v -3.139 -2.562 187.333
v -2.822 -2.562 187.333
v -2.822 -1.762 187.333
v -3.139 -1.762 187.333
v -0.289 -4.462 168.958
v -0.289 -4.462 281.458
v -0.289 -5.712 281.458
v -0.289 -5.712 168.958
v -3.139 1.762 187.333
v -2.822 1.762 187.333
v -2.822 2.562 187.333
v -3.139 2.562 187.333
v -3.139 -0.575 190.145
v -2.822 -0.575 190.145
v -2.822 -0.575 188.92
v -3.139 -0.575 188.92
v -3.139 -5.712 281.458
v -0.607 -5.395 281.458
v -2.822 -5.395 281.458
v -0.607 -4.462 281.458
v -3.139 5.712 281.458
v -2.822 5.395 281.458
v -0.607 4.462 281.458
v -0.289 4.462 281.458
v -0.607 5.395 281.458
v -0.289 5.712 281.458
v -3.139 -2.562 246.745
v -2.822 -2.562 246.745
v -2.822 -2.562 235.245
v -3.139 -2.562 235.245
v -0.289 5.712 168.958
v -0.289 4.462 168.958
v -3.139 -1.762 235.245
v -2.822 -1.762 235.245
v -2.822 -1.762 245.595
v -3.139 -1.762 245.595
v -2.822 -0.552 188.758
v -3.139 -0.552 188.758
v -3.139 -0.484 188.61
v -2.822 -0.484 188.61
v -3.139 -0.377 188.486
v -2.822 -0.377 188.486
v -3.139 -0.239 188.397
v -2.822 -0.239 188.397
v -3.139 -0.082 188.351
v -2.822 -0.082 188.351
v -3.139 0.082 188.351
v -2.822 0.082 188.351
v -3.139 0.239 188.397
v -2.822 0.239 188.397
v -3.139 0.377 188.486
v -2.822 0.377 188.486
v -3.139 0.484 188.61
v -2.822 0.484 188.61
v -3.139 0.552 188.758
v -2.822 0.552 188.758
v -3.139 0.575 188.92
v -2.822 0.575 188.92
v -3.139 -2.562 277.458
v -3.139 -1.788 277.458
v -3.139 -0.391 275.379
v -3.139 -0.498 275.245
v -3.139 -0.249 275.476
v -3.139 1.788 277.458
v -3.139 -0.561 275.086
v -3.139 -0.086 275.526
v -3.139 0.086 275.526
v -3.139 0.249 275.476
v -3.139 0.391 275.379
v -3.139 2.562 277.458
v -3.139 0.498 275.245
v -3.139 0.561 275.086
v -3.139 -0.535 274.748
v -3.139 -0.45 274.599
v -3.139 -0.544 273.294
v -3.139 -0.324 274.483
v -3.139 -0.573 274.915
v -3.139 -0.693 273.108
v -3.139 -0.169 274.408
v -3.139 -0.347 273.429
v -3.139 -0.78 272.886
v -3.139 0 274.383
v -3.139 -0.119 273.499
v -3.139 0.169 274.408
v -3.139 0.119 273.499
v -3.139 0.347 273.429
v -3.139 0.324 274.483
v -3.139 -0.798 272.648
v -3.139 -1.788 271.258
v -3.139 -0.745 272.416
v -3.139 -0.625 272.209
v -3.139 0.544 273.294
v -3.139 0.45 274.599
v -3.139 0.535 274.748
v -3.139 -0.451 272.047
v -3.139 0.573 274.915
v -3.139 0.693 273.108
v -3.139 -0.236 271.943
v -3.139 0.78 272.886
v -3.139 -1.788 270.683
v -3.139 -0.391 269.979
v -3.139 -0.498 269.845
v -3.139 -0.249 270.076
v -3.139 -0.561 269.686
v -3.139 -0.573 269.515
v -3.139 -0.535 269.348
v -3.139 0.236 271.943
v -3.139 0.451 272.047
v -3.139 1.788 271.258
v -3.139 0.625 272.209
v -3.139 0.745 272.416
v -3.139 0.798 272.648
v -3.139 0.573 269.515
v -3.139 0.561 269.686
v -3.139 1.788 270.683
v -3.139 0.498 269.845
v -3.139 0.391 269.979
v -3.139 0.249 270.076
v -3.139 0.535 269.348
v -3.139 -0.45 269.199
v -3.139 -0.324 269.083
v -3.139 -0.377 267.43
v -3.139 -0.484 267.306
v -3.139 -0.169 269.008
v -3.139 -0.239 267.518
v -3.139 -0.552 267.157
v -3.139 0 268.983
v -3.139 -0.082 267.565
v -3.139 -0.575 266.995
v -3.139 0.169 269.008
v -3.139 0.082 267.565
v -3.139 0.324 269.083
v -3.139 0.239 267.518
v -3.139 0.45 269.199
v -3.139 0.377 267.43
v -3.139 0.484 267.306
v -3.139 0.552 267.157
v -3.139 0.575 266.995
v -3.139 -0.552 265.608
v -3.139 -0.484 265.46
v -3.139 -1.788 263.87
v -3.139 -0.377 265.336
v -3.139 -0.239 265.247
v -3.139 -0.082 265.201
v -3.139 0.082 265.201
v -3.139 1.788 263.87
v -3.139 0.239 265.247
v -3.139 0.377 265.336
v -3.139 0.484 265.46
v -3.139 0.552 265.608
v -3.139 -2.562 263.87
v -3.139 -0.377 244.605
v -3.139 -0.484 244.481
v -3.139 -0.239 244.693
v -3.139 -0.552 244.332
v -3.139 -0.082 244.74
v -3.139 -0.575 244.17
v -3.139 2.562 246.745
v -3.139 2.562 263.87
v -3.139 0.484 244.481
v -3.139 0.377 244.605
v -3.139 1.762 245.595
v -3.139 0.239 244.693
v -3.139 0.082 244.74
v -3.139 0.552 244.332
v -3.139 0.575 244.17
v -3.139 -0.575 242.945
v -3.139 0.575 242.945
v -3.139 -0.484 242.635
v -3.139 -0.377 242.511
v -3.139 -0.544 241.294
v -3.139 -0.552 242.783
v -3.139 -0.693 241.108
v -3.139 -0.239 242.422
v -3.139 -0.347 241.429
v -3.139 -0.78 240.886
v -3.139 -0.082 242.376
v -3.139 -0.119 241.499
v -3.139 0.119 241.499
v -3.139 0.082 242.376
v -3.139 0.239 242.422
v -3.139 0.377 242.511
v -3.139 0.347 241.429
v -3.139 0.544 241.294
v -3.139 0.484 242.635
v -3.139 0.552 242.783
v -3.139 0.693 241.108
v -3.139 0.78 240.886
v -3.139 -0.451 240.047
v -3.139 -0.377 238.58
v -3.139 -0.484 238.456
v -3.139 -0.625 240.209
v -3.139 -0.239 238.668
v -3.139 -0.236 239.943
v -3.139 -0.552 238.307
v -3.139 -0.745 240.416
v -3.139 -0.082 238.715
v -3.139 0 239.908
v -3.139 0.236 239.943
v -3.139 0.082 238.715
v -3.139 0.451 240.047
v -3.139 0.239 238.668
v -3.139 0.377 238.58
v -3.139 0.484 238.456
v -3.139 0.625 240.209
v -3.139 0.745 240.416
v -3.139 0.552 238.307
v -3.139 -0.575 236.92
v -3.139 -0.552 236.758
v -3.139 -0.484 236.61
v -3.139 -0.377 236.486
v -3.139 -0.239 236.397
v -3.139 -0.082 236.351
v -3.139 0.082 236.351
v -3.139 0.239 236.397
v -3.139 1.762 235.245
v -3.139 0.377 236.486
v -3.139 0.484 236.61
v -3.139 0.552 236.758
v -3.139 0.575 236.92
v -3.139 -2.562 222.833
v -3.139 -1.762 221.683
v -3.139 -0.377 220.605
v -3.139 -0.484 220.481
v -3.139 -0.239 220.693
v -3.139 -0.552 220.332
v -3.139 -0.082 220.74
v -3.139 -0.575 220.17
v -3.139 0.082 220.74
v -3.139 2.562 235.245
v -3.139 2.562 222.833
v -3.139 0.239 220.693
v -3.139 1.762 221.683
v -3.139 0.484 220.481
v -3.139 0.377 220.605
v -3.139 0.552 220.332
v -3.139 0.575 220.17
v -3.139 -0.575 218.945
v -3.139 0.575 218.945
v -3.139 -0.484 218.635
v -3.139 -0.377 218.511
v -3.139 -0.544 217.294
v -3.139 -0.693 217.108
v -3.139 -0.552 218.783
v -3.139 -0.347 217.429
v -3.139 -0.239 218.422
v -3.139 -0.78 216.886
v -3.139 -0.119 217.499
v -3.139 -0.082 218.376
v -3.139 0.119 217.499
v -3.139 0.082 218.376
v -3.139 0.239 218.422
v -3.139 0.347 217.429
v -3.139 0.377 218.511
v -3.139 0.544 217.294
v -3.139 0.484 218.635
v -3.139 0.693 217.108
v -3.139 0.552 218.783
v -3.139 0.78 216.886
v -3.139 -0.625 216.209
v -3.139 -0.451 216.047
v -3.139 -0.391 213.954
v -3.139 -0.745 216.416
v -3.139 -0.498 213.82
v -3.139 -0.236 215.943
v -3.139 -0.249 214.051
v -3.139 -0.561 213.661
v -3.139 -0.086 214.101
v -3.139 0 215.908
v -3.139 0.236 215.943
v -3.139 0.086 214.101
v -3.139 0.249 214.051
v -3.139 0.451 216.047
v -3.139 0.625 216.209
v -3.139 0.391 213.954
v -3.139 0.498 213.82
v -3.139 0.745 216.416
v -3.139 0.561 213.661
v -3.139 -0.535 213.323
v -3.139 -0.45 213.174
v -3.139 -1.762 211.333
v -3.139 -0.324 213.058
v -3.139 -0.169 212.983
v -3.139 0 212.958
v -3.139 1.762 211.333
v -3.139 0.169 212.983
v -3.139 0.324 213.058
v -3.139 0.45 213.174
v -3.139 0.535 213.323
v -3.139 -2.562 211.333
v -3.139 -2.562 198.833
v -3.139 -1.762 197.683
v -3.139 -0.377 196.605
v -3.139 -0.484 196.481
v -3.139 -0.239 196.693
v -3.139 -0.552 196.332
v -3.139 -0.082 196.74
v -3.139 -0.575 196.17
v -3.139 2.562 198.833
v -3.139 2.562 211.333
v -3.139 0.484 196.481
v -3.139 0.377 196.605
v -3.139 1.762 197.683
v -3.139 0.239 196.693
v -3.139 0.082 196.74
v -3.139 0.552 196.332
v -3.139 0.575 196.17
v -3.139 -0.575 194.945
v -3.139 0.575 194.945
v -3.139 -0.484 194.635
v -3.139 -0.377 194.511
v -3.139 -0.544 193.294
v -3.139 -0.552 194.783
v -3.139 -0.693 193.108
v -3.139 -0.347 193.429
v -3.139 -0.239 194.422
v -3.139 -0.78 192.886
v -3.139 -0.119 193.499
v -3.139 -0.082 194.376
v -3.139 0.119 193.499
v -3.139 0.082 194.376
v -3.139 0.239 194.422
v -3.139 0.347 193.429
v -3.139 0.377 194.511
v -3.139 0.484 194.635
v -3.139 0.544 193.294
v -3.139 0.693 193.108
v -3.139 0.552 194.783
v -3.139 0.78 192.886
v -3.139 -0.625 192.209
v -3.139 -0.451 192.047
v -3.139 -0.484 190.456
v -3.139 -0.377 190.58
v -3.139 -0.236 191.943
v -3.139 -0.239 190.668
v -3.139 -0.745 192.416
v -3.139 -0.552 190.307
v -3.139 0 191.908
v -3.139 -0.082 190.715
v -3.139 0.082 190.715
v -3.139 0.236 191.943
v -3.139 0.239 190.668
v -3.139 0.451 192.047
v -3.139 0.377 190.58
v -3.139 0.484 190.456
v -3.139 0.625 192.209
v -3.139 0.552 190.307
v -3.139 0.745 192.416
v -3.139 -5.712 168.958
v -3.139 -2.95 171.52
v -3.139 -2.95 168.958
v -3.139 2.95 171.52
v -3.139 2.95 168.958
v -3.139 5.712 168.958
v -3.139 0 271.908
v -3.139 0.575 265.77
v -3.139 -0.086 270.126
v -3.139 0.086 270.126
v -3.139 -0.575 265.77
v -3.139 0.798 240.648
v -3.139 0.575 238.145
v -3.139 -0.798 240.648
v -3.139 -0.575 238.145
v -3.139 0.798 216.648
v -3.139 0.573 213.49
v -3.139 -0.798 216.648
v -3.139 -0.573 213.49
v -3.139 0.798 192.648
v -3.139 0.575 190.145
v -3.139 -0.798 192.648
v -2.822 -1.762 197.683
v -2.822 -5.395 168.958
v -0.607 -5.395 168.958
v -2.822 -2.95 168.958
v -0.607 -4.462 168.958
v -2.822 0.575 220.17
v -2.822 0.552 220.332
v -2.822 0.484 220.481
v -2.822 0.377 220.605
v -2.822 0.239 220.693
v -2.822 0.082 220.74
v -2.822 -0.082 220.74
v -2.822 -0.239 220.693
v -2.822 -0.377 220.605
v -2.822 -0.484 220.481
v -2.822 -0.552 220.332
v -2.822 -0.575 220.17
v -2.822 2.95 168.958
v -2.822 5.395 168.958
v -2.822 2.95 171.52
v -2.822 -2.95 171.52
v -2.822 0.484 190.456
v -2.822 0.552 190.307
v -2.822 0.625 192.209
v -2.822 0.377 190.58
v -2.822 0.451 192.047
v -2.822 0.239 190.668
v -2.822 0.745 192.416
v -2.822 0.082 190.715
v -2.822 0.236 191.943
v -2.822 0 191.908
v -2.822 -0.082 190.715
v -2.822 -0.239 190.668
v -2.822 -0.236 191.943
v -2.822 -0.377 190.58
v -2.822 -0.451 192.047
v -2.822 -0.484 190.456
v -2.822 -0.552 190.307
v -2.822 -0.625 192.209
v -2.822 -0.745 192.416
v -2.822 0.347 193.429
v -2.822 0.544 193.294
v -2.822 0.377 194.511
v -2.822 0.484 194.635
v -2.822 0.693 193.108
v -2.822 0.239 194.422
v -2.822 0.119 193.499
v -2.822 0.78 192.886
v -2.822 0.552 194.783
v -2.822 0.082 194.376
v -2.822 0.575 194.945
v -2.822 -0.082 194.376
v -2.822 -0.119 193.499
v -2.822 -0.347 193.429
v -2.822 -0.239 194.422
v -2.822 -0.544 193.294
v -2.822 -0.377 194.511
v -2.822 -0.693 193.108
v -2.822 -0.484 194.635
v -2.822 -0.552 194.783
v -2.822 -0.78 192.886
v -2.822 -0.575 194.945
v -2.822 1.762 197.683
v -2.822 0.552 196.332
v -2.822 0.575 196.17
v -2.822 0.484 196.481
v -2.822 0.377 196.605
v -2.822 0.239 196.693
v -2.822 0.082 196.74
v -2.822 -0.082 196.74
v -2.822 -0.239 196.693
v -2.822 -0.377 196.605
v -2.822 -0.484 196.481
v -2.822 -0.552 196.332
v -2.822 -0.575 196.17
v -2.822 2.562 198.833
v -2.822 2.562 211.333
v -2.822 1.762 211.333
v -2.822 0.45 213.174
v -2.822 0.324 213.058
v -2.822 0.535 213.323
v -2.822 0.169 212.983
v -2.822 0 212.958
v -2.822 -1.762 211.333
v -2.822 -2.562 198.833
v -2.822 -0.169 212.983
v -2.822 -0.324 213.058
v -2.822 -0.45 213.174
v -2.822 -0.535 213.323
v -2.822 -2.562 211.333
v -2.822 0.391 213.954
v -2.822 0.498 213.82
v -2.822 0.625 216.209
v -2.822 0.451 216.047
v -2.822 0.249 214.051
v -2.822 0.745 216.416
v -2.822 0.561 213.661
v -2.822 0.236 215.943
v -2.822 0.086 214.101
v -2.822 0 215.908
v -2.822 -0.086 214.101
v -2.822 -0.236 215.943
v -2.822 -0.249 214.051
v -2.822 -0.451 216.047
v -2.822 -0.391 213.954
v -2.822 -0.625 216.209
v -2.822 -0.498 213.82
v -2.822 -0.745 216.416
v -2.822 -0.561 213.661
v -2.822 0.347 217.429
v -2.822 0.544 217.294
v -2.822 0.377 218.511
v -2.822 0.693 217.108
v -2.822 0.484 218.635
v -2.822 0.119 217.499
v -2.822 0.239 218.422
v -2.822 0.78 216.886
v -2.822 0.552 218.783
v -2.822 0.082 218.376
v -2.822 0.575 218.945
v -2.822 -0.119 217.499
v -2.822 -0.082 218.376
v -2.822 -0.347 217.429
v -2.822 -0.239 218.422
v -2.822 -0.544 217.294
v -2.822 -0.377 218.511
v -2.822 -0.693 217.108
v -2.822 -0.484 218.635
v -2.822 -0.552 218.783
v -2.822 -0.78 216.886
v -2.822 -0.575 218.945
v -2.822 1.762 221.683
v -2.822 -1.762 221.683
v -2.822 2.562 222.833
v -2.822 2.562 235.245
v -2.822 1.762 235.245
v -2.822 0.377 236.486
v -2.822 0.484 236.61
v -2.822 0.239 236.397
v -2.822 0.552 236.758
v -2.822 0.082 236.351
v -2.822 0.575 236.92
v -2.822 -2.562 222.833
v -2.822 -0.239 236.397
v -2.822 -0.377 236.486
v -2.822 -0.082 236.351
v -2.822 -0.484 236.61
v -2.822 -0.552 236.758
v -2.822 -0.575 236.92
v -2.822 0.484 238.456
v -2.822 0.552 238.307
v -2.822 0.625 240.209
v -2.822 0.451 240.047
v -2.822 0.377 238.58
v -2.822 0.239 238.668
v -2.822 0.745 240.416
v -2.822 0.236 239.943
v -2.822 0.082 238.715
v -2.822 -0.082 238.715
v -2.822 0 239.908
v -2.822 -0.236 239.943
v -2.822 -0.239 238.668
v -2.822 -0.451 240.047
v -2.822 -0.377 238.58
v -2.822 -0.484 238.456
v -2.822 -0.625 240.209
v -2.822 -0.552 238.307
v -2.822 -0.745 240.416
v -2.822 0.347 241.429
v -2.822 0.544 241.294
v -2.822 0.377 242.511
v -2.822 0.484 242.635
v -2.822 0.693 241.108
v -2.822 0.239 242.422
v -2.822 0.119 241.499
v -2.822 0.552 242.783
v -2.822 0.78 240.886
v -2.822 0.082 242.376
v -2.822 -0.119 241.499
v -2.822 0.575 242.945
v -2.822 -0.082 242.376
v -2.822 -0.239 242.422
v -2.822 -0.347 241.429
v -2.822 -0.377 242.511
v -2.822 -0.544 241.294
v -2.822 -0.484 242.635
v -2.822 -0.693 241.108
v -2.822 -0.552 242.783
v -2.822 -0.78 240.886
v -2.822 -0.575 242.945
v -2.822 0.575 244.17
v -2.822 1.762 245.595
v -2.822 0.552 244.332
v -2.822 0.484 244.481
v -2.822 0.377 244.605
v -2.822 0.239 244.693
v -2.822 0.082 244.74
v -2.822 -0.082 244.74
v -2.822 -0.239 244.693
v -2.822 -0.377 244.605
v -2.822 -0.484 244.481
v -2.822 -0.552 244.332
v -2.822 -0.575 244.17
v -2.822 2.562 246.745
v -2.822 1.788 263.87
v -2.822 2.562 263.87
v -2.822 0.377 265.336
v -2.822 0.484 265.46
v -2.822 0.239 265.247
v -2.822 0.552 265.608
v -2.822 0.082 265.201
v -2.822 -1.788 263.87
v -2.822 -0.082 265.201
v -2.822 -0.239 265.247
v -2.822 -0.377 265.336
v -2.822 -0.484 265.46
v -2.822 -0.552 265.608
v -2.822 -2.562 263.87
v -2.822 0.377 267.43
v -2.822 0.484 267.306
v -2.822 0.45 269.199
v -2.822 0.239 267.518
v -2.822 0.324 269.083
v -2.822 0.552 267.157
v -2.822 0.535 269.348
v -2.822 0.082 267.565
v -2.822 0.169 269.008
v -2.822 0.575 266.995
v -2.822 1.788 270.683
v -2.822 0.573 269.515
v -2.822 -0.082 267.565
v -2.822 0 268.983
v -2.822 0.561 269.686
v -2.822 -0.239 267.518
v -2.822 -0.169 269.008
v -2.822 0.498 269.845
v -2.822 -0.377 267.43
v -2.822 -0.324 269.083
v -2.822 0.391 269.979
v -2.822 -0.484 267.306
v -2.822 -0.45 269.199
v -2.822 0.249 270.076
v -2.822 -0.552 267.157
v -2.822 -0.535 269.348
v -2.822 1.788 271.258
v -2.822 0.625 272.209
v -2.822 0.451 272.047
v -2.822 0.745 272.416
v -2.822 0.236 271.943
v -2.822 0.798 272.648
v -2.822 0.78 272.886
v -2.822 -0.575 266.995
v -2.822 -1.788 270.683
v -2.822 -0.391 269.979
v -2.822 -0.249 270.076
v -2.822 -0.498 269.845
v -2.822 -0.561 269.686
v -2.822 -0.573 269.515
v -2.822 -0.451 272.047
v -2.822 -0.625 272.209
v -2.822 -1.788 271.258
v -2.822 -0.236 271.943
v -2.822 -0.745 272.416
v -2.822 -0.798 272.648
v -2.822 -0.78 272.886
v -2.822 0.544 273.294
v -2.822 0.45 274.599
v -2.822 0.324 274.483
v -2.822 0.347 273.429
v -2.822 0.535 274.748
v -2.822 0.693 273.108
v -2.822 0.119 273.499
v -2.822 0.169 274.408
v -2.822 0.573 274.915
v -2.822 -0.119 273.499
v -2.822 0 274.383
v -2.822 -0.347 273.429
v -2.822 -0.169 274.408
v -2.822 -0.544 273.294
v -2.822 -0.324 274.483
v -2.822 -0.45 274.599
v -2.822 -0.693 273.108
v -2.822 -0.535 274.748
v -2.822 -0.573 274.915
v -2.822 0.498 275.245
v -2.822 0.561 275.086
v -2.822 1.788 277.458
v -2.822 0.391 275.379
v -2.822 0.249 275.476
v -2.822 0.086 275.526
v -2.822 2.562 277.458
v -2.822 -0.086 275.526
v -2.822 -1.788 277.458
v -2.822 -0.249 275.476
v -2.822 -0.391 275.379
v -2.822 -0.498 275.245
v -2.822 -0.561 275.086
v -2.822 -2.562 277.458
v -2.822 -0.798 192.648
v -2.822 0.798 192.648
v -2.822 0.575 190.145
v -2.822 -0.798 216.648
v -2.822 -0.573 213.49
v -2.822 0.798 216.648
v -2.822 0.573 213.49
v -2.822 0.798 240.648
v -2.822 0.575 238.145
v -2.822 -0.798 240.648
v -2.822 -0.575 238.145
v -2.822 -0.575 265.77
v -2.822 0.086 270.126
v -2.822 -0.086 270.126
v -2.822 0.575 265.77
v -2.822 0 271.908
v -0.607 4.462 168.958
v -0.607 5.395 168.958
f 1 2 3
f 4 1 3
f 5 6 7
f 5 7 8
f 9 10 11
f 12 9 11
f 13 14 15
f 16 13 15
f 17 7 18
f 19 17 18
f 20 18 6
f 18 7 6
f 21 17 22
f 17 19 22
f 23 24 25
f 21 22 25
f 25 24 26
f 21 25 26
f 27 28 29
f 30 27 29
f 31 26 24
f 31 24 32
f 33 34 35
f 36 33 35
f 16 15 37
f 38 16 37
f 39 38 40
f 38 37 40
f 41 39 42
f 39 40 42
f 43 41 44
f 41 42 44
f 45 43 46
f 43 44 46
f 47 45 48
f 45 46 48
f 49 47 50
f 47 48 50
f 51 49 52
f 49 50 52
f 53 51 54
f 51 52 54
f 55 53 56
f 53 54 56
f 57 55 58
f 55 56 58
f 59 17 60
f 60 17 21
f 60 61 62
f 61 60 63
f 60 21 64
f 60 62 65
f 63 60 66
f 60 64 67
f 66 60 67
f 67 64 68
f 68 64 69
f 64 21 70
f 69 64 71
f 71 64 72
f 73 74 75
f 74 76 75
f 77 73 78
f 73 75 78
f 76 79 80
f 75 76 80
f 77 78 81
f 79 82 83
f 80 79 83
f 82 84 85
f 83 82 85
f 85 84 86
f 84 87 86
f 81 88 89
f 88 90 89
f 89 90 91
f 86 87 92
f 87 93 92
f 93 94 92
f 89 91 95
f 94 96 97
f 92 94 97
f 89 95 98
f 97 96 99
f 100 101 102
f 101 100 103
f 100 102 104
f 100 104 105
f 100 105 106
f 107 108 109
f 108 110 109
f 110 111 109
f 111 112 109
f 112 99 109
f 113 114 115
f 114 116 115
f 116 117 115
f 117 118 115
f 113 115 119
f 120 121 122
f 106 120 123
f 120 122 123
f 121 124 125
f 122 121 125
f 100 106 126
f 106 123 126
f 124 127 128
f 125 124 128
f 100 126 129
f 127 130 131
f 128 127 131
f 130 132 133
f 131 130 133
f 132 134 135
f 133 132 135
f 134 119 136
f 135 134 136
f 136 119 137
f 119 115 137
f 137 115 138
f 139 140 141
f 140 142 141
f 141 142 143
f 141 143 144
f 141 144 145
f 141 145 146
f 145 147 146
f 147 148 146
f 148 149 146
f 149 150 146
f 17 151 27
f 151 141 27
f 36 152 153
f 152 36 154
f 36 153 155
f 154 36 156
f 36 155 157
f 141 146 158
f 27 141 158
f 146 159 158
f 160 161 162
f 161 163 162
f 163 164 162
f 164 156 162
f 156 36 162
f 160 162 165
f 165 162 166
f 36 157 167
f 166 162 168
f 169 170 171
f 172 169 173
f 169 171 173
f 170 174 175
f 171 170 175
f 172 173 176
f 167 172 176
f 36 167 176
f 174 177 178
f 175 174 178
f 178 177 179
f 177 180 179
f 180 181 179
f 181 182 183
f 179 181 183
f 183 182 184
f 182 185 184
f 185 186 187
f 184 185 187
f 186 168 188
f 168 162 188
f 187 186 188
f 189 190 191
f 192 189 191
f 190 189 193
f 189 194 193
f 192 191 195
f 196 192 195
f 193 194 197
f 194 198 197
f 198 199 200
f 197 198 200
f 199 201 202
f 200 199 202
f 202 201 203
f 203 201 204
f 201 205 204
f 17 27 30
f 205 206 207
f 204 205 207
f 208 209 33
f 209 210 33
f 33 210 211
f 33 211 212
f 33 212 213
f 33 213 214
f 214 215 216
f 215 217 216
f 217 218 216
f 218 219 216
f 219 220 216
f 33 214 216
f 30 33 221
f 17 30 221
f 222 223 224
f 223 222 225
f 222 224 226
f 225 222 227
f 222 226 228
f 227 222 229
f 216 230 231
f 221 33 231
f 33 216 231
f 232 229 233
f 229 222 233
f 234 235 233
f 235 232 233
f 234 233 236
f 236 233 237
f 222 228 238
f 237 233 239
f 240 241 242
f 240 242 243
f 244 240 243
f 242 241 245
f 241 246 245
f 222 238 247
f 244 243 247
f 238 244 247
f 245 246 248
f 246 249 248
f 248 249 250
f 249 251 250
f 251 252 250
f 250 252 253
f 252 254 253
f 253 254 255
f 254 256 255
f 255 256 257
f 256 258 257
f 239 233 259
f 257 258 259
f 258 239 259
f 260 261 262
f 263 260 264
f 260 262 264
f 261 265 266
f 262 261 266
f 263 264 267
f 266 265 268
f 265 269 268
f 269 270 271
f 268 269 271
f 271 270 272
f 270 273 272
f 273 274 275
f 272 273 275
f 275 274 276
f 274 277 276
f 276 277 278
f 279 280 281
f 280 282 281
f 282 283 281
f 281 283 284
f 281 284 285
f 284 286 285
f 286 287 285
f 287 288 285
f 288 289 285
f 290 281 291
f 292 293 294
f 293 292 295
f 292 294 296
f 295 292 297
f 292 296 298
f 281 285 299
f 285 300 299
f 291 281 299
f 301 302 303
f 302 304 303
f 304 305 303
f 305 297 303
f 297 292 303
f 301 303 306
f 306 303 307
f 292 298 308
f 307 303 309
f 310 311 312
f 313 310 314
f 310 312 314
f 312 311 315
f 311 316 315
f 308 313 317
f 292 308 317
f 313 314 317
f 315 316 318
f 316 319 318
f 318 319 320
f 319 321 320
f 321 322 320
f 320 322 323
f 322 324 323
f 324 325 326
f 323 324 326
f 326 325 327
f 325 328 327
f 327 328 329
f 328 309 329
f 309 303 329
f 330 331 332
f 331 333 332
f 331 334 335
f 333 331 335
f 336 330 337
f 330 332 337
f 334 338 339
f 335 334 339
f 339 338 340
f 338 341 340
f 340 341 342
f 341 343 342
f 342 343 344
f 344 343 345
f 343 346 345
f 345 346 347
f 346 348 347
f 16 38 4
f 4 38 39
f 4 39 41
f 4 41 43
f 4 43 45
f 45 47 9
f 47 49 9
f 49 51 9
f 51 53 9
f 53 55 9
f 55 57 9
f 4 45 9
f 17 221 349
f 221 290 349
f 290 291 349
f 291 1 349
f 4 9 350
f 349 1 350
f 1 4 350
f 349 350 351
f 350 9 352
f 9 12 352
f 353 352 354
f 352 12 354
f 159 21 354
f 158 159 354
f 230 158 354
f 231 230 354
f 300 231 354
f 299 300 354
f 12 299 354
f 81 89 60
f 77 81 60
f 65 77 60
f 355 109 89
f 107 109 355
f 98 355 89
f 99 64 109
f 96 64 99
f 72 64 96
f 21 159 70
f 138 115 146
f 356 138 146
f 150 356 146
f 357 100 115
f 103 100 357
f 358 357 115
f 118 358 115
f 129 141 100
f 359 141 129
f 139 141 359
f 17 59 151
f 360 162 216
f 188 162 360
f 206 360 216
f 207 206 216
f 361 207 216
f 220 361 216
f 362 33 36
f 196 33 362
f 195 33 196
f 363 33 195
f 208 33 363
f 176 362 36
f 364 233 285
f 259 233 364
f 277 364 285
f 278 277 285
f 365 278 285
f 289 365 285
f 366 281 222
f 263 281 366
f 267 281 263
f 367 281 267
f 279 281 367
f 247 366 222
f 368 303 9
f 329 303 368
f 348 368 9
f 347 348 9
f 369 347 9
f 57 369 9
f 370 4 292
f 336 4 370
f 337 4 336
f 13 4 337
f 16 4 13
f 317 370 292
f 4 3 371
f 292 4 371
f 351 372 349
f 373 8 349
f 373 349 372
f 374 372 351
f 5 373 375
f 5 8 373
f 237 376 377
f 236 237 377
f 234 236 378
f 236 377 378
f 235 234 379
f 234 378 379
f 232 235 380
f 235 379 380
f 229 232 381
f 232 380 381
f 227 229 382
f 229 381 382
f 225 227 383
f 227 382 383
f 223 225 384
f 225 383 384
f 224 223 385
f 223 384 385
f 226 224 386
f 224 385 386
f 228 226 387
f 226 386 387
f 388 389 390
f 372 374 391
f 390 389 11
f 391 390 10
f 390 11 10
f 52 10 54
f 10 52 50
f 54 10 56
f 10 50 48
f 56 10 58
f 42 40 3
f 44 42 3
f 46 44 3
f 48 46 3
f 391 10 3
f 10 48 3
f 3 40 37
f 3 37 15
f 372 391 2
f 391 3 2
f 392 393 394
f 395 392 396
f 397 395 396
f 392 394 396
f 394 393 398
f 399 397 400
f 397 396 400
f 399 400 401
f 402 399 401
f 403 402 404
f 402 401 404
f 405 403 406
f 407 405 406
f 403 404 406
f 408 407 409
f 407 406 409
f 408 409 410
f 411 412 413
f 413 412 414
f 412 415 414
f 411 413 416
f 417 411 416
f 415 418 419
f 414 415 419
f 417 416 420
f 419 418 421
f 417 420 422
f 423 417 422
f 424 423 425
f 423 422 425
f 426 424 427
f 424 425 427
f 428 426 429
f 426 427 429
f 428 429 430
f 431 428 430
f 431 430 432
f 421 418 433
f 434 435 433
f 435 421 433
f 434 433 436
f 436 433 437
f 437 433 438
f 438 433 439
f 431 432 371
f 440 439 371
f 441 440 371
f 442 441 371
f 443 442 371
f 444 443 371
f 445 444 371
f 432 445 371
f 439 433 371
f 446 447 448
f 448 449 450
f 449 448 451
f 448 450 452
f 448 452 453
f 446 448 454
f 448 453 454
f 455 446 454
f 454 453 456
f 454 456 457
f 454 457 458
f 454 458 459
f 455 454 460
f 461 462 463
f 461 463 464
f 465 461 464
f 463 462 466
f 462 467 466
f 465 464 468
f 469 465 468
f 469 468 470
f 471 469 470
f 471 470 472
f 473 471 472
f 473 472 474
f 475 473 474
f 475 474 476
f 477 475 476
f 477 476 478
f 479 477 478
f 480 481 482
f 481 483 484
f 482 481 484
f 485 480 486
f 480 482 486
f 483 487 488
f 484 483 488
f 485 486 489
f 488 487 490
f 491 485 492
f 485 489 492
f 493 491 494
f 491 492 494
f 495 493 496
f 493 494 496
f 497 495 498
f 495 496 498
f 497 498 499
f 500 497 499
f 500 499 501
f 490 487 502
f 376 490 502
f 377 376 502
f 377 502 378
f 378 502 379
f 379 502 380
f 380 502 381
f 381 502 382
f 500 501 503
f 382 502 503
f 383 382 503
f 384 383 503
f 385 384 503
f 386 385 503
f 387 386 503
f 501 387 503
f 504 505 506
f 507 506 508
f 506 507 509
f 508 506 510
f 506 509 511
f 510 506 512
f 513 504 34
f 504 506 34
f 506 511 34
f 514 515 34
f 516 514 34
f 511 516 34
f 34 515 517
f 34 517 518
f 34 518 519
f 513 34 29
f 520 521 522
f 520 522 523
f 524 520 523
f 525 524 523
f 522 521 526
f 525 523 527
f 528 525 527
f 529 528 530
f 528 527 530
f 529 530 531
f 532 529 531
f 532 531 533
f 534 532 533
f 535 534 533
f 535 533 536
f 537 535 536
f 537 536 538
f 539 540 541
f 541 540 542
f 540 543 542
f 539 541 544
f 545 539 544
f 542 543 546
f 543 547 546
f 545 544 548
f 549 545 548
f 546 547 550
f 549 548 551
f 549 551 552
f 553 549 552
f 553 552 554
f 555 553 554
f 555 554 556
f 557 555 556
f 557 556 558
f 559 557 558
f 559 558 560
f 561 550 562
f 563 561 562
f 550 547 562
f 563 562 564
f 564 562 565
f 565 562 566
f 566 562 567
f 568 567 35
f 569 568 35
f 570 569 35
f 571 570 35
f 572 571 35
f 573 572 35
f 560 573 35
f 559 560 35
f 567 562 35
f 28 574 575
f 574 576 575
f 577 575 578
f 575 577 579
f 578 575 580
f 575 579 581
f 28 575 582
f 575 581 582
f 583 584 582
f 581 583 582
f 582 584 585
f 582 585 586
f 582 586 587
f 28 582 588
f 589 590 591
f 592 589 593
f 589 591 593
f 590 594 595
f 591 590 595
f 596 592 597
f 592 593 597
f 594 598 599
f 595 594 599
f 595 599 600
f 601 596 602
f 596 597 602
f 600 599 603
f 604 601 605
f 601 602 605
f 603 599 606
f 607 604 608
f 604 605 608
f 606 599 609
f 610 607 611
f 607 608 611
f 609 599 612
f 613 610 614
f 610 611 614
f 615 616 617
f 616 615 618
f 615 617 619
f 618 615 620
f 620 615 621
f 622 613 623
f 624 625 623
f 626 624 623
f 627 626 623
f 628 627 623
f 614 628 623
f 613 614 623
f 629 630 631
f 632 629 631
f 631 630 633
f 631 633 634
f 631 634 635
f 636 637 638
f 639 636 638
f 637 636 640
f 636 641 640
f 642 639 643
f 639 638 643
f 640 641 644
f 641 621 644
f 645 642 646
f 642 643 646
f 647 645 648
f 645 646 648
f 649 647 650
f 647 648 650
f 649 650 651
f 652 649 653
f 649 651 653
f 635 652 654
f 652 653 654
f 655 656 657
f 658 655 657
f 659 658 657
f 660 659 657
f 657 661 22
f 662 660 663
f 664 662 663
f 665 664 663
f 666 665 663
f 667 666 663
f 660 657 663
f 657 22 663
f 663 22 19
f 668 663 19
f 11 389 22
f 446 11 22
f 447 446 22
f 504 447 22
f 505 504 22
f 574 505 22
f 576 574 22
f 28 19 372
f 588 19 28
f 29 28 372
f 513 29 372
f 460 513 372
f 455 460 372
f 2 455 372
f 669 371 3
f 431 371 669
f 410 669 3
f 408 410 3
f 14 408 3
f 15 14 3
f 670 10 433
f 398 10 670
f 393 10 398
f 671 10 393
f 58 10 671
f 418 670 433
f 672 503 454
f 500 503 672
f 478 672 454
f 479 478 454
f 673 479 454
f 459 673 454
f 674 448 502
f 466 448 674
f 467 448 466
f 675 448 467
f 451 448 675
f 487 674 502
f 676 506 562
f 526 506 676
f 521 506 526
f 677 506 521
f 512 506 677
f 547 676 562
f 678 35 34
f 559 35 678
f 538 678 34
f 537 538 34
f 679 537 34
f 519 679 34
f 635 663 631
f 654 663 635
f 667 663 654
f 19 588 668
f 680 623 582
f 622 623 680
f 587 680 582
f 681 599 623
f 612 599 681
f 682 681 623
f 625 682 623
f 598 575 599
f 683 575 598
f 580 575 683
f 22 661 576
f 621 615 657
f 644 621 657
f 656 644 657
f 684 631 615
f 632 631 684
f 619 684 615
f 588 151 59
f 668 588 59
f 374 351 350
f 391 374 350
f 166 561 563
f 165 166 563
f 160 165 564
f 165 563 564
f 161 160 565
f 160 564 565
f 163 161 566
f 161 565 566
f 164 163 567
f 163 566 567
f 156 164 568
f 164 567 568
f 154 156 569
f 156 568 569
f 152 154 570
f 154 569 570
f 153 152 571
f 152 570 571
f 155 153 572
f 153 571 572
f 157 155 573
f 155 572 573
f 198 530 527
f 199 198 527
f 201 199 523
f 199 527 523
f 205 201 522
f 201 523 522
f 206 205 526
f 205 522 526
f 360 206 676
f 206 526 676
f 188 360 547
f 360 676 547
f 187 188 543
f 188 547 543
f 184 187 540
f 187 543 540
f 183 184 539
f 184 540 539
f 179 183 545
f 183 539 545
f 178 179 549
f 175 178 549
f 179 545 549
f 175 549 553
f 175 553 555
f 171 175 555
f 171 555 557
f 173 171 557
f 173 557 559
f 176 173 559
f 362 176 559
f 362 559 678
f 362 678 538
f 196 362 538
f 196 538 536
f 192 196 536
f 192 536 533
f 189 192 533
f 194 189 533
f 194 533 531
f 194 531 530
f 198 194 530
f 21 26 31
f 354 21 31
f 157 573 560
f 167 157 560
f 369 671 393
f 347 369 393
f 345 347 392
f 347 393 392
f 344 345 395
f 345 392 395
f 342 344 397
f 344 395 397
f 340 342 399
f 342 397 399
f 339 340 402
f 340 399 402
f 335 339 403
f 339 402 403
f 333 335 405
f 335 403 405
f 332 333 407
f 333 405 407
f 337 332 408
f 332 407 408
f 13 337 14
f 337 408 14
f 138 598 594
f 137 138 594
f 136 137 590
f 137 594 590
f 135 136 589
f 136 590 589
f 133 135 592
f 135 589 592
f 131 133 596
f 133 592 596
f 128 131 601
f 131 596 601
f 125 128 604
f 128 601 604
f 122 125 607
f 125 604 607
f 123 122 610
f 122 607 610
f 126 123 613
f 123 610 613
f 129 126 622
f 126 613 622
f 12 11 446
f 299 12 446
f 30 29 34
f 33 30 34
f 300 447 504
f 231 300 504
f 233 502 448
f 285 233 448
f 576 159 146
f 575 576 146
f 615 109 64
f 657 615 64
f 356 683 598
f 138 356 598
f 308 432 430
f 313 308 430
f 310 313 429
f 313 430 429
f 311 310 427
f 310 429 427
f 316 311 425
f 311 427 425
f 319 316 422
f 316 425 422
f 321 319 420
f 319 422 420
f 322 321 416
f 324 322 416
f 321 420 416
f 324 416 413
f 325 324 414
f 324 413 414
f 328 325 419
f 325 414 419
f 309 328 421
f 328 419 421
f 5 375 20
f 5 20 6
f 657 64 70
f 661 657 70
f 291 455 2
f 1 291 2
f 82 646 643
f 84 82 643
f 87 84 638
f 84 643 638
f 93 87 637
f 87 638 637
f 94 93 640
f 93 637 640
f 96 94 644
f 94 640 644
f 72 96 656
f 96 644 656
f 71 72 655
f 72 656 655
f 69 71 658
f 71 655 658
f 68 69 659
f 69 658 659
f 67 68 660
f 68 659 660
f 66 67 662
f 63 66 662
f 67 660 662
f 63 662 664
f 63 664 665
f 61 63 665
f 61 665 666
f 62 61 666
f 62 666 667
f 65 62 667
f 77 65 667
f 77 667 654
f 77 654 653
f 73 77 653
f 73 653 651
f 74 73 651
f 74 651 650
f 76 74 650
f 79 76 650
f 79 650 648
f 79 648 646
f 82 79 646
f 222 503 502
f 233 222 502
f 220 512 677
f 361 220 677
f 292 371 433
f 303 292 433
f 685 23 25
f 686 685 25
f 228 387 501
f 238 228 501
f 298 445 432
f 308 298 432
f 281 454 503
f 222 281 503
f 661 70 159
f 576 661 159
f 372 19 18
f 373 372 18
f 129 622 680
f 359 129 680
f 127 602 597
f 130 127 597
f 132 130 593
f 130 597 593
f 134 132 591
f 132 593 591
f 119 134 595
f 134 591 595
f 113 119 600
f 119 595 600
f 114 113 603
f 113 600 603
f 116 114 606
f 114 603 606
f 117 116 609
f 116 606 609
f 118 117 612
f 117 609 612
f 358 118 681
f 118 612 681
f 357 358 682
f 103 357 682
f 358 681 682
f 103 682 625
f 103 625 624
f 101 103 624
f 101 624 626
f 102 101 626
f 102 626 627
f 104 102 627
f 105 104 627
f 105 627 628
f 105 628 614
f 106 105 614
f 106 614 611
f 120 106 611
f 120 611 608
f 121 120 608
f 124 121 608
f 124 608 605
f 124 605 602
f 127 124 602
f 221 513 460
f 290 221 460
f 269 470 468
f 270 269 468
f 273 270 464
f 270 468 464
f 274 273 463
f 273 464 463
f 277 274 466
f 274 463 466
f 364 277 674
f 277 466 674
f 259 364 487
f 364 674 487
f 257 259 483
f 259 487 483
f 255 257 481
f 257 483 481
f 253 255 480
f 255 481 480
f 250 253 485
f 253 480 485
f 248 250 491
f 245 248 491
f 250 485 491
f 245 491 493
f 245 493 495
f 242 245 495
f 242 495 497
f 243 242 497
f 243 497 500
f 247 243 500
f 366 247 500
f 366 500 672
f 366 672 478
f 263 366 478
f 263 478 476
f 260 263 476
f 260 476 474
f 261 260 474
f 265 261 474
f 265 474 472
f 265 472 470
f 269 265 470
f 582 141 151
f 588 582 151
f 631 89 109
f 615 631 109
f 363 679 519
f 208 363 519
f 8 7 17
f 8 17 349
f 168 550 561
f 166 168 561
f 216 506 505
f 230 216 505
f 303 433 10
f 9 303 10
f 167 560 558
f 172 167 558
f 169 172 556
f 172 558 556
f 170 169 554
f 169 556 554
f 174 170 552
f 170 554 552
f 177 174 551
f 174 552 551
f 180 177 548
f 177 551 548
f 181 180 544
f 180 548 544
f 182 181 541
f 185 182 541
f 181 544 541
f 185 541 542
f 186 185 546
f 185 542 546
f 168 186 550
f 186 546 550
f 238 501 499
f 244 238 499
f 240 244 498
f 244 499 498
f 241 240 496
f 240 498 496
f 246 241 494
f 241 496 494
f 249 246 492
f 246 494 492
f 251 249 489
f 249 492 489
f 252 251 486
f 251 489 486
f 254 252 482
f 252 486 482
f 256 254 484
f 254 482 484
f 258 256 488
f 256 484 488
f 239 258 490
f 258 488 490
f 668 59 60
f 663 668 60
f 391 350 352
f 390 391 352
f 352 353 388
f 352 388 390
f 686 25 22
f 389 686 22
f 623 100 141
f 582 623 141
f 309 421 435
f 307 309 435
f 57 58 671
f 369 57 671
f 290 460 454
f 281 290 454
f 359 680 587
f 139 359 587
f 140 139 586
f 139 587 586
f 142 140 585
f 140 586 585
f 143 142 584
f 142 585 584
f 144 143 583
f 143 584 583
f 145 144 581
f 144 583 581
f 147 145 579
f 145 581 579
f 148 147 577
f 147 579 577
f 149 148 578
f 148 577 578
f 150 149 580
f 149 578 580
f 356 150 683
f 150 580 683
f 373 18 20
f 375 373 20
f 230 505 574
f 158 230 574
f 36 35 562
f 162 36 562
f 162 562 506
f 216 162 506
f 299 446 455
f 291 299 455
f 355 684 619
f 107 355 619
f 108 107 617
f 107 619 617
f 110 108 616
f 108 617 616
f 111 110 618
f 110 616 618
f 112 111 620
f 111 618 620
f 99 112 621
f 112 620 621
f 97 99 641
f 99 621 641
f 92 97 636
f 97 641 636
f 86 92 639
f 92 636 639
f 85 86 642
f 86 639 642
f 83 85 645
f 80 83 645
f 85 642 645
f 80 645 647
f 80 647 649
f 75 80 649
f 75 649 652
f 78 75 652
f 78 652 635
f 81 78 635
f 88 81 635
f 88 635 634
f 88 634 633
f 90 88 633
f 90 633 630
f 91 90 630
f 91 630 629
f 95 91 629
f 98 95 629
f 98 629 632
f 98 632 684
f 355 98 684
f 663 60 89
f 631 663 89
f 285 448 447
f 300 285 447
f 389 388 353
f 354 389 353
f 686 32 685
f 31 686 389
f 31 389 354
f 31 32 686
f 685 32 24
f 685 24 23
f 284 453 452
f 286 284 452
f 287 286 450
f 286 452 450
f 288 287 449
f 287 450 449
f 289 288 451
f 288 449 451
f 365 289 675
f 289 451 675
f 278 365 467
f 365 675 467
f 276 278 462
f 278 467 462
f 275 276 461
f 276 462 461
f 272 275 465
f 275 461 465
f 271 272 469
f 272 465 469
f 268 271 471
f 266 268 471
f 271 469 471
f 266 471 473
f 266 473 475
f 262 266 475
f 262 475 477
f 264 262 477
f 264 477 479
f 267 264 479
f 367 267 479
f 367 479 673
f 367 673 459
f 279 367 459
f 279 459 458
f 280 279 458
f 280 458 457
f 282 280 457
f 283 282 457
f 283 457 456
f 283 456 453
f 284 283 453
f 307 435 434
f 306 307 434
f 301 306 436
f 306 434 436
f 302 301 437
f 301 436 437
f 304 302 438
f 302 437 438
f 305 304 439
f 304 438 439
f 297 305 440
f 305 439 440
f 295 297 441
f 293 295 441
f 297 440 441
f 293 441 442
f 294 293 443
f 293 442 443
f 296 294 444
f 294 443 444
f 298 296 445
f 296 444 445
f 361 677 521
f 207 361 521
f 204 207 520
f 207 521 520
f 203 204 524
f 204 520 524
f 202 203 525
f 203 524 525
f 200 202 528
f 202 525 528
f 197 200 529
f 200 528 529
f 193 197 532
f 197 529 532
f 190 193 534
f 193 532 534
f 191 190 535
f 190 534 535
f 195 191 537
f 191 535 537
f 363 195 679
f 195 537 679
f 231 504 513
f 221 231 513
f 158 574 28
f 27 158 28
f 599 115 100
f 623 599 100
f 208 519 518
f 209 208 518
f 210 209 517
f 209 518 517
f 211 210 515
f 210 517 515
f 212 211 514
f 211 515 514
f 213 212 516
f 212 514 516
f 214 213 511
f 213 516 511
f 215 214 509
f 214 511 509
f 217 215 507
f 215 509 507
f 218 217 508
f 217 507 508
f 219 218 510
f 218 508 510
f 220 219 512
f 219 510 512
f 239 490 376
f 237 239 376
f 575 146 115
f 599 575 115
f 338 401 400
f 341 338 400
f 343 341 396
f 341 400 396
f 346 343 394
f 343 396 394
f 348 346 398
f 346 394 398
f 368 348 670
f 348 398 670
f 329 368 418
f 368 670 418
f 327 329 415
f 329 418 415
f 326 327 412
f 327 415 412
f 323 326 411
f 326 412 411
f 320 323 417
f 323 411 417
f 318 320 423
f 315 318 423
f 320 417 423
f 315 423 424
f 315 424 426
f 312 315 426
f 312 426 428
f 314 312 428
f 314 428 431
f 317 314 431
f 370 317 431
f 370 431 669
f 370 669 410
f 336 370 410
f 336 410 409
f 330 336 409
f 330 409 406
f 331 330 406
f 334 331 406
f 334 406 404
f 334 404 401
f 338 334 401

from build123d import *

# Parameters (mm, degrees)
SKETCH1_W                      = 450
SKETCH1_H                      = 45.7
BOSS_EXTRUDE1_DEPTH            = 11.4
CUT_EXTRUDE1_DEPTH             = 451
SKETCH3_W                      = 10.25
SKETCH3_H                      = 23.6
CUT_EXTRUDE2_DEPTH             = 12.4
CUT_EXTRUDE3_DEPTH             = 2.27
CUT_EXTRUDE4_DEPTH             = 2.27
CUT_EXTRUDE5_DEPTH             = 2.27
CUT_EXTRUDE6_DEPTH             = 2.27
CUT_EXTRUDE7_DEPTH             = 2.27
CUT_EXTRUDE8_DEPTH             = 2.27
CUT_EXTRUDE9_DEPTH             = 2.27
CUT_EXTRUDE10_DEPTH            = 2.27
CUT_EXTRUDE11_DEPTH            = 2.27
CUT_EXTRUDE12_DEPTH            = 12.4
F_6_4_6_4_DIAMETER_HOLE1_D     = 6.4
F_6_4_6_4_DIAMETER_HOLE1_DEPTH = 11.4
F_4_6_4_6_DIAMETER_HOLE1_D     = 4.6
F_4_6_4_6_DIAMETER_HOLE1_DEPTH = 11.4
SCALE1_SCALE                   = 0.25


with BuildPart() as part:
    # Sketch1 → Boss-Extrude1 (new body)
    with BuildSketch(Plane(origin=(5.7, 0, 0), x_dir=(0, 0, -1), z_dir=(1, 0, 0))):
        with Locations((-225, 0)):
            Rectangle(SKETCH1_W, SKETCH1_H)
    extrude(amount=-BOSS_EXTRUDE1_DEPTH)

    # Sketch2 → Cut-Extrude1 (cut, through all)
    with BuildSketch(Plane.XY.offset(450)):
        Polygon((5.7, 17.85), (4.43, 17.85), (4.43, 21.58), (-4.43, 21.58), (-4.43, -21.58), (4.43, -21.58), (4.43, -17.85), (5.7, -17.85), align=None)
    extrude(amount=-CUT_EXTRUDE1_DEPTH, mode=Mode.SUBTRACT)

    # Sketch3 → Cut-Extrude2 (cut, through all)
    with BuildSketch(Plane.ZY.offset(5.7)):
        with Locations((5.125, 0)):
            Rectangle(SKETCH3_W, SKETCH3_H)
    extrude(amount=-CUT_EXTRUDE2_DEPTH, mode=Mode.SUBTRACT)

    # Sketch4 → Cut-Extrude3 (cut, through all)
    with BuildSketch(Plane(origin=(-4.43, 0, 0), x_dir=(0, 0, -1), z_dir=(1, 0, 0))):
        Polygon((-169.5, -10.25), (-169.5, -7.05), (-210.9, -7.05), (-210.9, 7.05), (-169.5, 7.05), (-169.5, 10.25), (-215.5, 10.25), (-215.5, -10.25), align=None)
    extrude(amount=-CUT_EXTRUDE3_DEPTH, mode=Mode.SUBTRACT)

    # Sketch5 → Cut-Extrude4 (cut, through all)
    with BuildSketch(Plane(origin=(-4.43, 0, 0), x_dir=(0, 0, -1), z_dir=(1, 0, 0))):
        Polygon((-119.5, -10.25), (-73.5, -10.25), (-73.5, -7.05), (-114.9, -7.05), (-114.9, 7.05), (-73.5, 7.05), (-73.5, 10.25), (-119.5, 10.25), align=None)
    extrude(amount=-CUT_EXTRUDE4_DEPTH, mode=Mode.SUBTRACT)

    # Sketch6 → Cut-Extrude5 (cut, through all)
    with BuildSketch(Plane(origin=(-4.43, 0, 0), x_dir=(0, 0, -1), z_dir=(1, 0, 0))):
        Polygon((-265.15, 7.05), (-265.15, 10.25), (-311.15, 10.25), (-311.15, -10.25), (-265.15, -10.25), (-265.15, -7.05), (-306.55, -7.05), (-306.55, 7.05), align=None)
    extrude(amount=-CUT_EXTRUDE5_DEPTH, mode=Mode.SUBTRACT)

    # Sketch7 → Cut-Extrude6 (cut, through all)
    with BuildSketch(Plane(origin=(-4.43, 0, 0), x_dir=(0, 0, -1), z_dir=(1, 0, 0))):
        with BuildLine():
            Line((-79.85, 2.3), (-84.75, 2.3))
            ThreePointArc((-84.75, 2.3), (-87.05, 0), (-84.75, -2.3))
            Line((-84.75, -2.3), (-79.85, -2.3))
            ThreePointArc((-79.85, -2.3), (-77.55, 0), (-79.85, 2.3))
        make_face()
    extrude(amount=-CUT_EXTRUDE6_DEPTH, mode=Mode.SUBTRACT)

    # Sketch8 → Cut-Extrude7 (cut, through all)
    with BuildSketch(Plane(origin=(-4.43, 0, 0), x_dir=(0, 0, -1), z_dir=(1, 0, 0))):
        with BuildLine():
            Line((-108.85, -2.3), (-103.95, -2.3))
            ThreePointArc((-103.95, -2.3), (-101.65, 0), (-103.95, 2.3))
            Line((-103.95, 2.3), (-108.85, 2.3))
            ThreePointArc((-108.85, 2.3), (-111.15, 0), (-108.85, -2.3))
        make_face()
    extrude(amount=-CUT_EXTRUDE7_DEPTH, mode=Mode.SUBTRACT)

    # Sketch9 → Cut-Extrude8 (cut, through all)
    with BuildSketch(Plane(origin=(-4.43, 0, 0), x_dir=(0, 0, -1), z_dir=(1, 0, 0))):
        with BuildLine():
            Line((-387.25, 2.3), (-392.15, 2.3))
            ThreePointArc((-392.15, 2.3), (-394.45, 0), (-392.15, -2.3))
            Line((-392.15, -2.3), (-387.25, -2.3))
            ThreePointArc((-387.25, -2.3), (-384.95, 0), (-387.25, 2.3))
        make_face()
    extrude(amount=-CUT_EXTRUDE8_DEPTH, mode=Mode.SUBTRACT)

    # Sketch10 → Cut-Extrude9 (cut, through all)
    with BuildSketch(Plane(origin=(-4.43, 0, 0), x_dir=(0, 0, -1), z_dir=(1, 0, 0))):
        with BuildLine():
            Line((-199.95, 2.3), (-204.85, 2.3))
            ThreePointArc((-204.85, 2.3), (-207.15, 0), (-204.85, -2.3))
            Line((-204.85, -2.3), (-199.95, -2.3))
            ThreePointArc((-199.95, -2.3), (-197.65, 0), (-199.95, 2.3))
        make_face()
    extrude(amount=-CUT_EXTRUDE9_DEPTH, mode=Mode.SUBTRACT)

    # Sketch11 → Cut-Extrude10 (cut, through all)
    with BuildSketch(Plane(origin=(-4.43, 0, 0), x_dir=(0, 0, -1), z_dir=(1, 0, 0))):
        with BuildLine():
            Line((-295.95, 2.3), (-300.85, 2.3))
            ThreePointArc((-300.85, 2.3), (-303.15, 0), (-300.85, -2.3))
            Line((-300.85, -2.3), (-295.95, -2.3))
            ThreePointArc((-295.95, -2.3), (-293.65, 0), (-295.95, 2.3))
        make_face()
    extrude(amount=-CUT_EXTRUDE10_DEPTH, mode=Mode.SUBTRACT)

    # Sketch12 → Cut-Extrude11 (cut, through all)
    with BuildSketch(Plane(origin=(-4.43, 0, 0), x_dir=(0, 0, -1), z_dir=(1, 0, 0))):
        with BuildLine():
            Line((-271.85, 2.3), (-276.75, 2.3))
            ThreePointArc((-276.75, 2.3), (-279.05, 0), (-276.75, -2.3))
            Line((-276.75, -2.3), (-271.85, -2.3))
            ThreePointArc((-271.85, -2.3), (-269.55, 0), (-271.85, 2.3))
        make_face()
    extrude(amount=-CUT_EXTRUDE11_DEPTH, mode=Mode.SUBTRACT)

    # Sketch13 → Cut-Extrude12 (cut, through all)
    with BuildSketch(Plane.ZY.offset(5.7)):
        Polygon((434, -7.15), (409.2, -7.15), (409.2, 7.15), (434, 7.15), (434, 10.25), (379.65, 10.25), (379.65, 7.15), (406.9, 7.15), (406.9, -7.15), (379.65, -7.15), (379.65, -10.25), (434, -10.25), align=None)
    extrude(amount=-CUT_EXTRUDE12_DEPTH, mode=Mode.SUBTRACT)

    # Ø6.4 (6.4) Diameter Hole1
    with Locations(Plane.ZY.offset(5.7)):
        with Locations((415, 0), (287, 0), (191, 0), (95, 0)):
            Hole(F_6_4_6_4_DIAMETER_HOLE1_D / 2, depth=F_6_4_6_4_DIAMETER_HOLE1_DEPTH)

    # Ø4.6 (4.6) Diameter Hole1
    with Locations(Plane.ZY.offset(5.7)):
        with Locations((424, 0), (402.4, 0), (178.3, 0)):
            Hole(F_4_6_4_6_DIAMETER_HOLE1_D / 2, depth=F_4_6_4_6_DIAMETER_HOLE1_DEPTH)


with BuildPart() as part_1:
    # Scale1: scaled about (-2.285927212, 0, 225.277222982)
    add(part.part.scale(SCALE1_SCALE).moved(Location((-1.714445409, 0, 168.957917237))))


solid = part_1.part
